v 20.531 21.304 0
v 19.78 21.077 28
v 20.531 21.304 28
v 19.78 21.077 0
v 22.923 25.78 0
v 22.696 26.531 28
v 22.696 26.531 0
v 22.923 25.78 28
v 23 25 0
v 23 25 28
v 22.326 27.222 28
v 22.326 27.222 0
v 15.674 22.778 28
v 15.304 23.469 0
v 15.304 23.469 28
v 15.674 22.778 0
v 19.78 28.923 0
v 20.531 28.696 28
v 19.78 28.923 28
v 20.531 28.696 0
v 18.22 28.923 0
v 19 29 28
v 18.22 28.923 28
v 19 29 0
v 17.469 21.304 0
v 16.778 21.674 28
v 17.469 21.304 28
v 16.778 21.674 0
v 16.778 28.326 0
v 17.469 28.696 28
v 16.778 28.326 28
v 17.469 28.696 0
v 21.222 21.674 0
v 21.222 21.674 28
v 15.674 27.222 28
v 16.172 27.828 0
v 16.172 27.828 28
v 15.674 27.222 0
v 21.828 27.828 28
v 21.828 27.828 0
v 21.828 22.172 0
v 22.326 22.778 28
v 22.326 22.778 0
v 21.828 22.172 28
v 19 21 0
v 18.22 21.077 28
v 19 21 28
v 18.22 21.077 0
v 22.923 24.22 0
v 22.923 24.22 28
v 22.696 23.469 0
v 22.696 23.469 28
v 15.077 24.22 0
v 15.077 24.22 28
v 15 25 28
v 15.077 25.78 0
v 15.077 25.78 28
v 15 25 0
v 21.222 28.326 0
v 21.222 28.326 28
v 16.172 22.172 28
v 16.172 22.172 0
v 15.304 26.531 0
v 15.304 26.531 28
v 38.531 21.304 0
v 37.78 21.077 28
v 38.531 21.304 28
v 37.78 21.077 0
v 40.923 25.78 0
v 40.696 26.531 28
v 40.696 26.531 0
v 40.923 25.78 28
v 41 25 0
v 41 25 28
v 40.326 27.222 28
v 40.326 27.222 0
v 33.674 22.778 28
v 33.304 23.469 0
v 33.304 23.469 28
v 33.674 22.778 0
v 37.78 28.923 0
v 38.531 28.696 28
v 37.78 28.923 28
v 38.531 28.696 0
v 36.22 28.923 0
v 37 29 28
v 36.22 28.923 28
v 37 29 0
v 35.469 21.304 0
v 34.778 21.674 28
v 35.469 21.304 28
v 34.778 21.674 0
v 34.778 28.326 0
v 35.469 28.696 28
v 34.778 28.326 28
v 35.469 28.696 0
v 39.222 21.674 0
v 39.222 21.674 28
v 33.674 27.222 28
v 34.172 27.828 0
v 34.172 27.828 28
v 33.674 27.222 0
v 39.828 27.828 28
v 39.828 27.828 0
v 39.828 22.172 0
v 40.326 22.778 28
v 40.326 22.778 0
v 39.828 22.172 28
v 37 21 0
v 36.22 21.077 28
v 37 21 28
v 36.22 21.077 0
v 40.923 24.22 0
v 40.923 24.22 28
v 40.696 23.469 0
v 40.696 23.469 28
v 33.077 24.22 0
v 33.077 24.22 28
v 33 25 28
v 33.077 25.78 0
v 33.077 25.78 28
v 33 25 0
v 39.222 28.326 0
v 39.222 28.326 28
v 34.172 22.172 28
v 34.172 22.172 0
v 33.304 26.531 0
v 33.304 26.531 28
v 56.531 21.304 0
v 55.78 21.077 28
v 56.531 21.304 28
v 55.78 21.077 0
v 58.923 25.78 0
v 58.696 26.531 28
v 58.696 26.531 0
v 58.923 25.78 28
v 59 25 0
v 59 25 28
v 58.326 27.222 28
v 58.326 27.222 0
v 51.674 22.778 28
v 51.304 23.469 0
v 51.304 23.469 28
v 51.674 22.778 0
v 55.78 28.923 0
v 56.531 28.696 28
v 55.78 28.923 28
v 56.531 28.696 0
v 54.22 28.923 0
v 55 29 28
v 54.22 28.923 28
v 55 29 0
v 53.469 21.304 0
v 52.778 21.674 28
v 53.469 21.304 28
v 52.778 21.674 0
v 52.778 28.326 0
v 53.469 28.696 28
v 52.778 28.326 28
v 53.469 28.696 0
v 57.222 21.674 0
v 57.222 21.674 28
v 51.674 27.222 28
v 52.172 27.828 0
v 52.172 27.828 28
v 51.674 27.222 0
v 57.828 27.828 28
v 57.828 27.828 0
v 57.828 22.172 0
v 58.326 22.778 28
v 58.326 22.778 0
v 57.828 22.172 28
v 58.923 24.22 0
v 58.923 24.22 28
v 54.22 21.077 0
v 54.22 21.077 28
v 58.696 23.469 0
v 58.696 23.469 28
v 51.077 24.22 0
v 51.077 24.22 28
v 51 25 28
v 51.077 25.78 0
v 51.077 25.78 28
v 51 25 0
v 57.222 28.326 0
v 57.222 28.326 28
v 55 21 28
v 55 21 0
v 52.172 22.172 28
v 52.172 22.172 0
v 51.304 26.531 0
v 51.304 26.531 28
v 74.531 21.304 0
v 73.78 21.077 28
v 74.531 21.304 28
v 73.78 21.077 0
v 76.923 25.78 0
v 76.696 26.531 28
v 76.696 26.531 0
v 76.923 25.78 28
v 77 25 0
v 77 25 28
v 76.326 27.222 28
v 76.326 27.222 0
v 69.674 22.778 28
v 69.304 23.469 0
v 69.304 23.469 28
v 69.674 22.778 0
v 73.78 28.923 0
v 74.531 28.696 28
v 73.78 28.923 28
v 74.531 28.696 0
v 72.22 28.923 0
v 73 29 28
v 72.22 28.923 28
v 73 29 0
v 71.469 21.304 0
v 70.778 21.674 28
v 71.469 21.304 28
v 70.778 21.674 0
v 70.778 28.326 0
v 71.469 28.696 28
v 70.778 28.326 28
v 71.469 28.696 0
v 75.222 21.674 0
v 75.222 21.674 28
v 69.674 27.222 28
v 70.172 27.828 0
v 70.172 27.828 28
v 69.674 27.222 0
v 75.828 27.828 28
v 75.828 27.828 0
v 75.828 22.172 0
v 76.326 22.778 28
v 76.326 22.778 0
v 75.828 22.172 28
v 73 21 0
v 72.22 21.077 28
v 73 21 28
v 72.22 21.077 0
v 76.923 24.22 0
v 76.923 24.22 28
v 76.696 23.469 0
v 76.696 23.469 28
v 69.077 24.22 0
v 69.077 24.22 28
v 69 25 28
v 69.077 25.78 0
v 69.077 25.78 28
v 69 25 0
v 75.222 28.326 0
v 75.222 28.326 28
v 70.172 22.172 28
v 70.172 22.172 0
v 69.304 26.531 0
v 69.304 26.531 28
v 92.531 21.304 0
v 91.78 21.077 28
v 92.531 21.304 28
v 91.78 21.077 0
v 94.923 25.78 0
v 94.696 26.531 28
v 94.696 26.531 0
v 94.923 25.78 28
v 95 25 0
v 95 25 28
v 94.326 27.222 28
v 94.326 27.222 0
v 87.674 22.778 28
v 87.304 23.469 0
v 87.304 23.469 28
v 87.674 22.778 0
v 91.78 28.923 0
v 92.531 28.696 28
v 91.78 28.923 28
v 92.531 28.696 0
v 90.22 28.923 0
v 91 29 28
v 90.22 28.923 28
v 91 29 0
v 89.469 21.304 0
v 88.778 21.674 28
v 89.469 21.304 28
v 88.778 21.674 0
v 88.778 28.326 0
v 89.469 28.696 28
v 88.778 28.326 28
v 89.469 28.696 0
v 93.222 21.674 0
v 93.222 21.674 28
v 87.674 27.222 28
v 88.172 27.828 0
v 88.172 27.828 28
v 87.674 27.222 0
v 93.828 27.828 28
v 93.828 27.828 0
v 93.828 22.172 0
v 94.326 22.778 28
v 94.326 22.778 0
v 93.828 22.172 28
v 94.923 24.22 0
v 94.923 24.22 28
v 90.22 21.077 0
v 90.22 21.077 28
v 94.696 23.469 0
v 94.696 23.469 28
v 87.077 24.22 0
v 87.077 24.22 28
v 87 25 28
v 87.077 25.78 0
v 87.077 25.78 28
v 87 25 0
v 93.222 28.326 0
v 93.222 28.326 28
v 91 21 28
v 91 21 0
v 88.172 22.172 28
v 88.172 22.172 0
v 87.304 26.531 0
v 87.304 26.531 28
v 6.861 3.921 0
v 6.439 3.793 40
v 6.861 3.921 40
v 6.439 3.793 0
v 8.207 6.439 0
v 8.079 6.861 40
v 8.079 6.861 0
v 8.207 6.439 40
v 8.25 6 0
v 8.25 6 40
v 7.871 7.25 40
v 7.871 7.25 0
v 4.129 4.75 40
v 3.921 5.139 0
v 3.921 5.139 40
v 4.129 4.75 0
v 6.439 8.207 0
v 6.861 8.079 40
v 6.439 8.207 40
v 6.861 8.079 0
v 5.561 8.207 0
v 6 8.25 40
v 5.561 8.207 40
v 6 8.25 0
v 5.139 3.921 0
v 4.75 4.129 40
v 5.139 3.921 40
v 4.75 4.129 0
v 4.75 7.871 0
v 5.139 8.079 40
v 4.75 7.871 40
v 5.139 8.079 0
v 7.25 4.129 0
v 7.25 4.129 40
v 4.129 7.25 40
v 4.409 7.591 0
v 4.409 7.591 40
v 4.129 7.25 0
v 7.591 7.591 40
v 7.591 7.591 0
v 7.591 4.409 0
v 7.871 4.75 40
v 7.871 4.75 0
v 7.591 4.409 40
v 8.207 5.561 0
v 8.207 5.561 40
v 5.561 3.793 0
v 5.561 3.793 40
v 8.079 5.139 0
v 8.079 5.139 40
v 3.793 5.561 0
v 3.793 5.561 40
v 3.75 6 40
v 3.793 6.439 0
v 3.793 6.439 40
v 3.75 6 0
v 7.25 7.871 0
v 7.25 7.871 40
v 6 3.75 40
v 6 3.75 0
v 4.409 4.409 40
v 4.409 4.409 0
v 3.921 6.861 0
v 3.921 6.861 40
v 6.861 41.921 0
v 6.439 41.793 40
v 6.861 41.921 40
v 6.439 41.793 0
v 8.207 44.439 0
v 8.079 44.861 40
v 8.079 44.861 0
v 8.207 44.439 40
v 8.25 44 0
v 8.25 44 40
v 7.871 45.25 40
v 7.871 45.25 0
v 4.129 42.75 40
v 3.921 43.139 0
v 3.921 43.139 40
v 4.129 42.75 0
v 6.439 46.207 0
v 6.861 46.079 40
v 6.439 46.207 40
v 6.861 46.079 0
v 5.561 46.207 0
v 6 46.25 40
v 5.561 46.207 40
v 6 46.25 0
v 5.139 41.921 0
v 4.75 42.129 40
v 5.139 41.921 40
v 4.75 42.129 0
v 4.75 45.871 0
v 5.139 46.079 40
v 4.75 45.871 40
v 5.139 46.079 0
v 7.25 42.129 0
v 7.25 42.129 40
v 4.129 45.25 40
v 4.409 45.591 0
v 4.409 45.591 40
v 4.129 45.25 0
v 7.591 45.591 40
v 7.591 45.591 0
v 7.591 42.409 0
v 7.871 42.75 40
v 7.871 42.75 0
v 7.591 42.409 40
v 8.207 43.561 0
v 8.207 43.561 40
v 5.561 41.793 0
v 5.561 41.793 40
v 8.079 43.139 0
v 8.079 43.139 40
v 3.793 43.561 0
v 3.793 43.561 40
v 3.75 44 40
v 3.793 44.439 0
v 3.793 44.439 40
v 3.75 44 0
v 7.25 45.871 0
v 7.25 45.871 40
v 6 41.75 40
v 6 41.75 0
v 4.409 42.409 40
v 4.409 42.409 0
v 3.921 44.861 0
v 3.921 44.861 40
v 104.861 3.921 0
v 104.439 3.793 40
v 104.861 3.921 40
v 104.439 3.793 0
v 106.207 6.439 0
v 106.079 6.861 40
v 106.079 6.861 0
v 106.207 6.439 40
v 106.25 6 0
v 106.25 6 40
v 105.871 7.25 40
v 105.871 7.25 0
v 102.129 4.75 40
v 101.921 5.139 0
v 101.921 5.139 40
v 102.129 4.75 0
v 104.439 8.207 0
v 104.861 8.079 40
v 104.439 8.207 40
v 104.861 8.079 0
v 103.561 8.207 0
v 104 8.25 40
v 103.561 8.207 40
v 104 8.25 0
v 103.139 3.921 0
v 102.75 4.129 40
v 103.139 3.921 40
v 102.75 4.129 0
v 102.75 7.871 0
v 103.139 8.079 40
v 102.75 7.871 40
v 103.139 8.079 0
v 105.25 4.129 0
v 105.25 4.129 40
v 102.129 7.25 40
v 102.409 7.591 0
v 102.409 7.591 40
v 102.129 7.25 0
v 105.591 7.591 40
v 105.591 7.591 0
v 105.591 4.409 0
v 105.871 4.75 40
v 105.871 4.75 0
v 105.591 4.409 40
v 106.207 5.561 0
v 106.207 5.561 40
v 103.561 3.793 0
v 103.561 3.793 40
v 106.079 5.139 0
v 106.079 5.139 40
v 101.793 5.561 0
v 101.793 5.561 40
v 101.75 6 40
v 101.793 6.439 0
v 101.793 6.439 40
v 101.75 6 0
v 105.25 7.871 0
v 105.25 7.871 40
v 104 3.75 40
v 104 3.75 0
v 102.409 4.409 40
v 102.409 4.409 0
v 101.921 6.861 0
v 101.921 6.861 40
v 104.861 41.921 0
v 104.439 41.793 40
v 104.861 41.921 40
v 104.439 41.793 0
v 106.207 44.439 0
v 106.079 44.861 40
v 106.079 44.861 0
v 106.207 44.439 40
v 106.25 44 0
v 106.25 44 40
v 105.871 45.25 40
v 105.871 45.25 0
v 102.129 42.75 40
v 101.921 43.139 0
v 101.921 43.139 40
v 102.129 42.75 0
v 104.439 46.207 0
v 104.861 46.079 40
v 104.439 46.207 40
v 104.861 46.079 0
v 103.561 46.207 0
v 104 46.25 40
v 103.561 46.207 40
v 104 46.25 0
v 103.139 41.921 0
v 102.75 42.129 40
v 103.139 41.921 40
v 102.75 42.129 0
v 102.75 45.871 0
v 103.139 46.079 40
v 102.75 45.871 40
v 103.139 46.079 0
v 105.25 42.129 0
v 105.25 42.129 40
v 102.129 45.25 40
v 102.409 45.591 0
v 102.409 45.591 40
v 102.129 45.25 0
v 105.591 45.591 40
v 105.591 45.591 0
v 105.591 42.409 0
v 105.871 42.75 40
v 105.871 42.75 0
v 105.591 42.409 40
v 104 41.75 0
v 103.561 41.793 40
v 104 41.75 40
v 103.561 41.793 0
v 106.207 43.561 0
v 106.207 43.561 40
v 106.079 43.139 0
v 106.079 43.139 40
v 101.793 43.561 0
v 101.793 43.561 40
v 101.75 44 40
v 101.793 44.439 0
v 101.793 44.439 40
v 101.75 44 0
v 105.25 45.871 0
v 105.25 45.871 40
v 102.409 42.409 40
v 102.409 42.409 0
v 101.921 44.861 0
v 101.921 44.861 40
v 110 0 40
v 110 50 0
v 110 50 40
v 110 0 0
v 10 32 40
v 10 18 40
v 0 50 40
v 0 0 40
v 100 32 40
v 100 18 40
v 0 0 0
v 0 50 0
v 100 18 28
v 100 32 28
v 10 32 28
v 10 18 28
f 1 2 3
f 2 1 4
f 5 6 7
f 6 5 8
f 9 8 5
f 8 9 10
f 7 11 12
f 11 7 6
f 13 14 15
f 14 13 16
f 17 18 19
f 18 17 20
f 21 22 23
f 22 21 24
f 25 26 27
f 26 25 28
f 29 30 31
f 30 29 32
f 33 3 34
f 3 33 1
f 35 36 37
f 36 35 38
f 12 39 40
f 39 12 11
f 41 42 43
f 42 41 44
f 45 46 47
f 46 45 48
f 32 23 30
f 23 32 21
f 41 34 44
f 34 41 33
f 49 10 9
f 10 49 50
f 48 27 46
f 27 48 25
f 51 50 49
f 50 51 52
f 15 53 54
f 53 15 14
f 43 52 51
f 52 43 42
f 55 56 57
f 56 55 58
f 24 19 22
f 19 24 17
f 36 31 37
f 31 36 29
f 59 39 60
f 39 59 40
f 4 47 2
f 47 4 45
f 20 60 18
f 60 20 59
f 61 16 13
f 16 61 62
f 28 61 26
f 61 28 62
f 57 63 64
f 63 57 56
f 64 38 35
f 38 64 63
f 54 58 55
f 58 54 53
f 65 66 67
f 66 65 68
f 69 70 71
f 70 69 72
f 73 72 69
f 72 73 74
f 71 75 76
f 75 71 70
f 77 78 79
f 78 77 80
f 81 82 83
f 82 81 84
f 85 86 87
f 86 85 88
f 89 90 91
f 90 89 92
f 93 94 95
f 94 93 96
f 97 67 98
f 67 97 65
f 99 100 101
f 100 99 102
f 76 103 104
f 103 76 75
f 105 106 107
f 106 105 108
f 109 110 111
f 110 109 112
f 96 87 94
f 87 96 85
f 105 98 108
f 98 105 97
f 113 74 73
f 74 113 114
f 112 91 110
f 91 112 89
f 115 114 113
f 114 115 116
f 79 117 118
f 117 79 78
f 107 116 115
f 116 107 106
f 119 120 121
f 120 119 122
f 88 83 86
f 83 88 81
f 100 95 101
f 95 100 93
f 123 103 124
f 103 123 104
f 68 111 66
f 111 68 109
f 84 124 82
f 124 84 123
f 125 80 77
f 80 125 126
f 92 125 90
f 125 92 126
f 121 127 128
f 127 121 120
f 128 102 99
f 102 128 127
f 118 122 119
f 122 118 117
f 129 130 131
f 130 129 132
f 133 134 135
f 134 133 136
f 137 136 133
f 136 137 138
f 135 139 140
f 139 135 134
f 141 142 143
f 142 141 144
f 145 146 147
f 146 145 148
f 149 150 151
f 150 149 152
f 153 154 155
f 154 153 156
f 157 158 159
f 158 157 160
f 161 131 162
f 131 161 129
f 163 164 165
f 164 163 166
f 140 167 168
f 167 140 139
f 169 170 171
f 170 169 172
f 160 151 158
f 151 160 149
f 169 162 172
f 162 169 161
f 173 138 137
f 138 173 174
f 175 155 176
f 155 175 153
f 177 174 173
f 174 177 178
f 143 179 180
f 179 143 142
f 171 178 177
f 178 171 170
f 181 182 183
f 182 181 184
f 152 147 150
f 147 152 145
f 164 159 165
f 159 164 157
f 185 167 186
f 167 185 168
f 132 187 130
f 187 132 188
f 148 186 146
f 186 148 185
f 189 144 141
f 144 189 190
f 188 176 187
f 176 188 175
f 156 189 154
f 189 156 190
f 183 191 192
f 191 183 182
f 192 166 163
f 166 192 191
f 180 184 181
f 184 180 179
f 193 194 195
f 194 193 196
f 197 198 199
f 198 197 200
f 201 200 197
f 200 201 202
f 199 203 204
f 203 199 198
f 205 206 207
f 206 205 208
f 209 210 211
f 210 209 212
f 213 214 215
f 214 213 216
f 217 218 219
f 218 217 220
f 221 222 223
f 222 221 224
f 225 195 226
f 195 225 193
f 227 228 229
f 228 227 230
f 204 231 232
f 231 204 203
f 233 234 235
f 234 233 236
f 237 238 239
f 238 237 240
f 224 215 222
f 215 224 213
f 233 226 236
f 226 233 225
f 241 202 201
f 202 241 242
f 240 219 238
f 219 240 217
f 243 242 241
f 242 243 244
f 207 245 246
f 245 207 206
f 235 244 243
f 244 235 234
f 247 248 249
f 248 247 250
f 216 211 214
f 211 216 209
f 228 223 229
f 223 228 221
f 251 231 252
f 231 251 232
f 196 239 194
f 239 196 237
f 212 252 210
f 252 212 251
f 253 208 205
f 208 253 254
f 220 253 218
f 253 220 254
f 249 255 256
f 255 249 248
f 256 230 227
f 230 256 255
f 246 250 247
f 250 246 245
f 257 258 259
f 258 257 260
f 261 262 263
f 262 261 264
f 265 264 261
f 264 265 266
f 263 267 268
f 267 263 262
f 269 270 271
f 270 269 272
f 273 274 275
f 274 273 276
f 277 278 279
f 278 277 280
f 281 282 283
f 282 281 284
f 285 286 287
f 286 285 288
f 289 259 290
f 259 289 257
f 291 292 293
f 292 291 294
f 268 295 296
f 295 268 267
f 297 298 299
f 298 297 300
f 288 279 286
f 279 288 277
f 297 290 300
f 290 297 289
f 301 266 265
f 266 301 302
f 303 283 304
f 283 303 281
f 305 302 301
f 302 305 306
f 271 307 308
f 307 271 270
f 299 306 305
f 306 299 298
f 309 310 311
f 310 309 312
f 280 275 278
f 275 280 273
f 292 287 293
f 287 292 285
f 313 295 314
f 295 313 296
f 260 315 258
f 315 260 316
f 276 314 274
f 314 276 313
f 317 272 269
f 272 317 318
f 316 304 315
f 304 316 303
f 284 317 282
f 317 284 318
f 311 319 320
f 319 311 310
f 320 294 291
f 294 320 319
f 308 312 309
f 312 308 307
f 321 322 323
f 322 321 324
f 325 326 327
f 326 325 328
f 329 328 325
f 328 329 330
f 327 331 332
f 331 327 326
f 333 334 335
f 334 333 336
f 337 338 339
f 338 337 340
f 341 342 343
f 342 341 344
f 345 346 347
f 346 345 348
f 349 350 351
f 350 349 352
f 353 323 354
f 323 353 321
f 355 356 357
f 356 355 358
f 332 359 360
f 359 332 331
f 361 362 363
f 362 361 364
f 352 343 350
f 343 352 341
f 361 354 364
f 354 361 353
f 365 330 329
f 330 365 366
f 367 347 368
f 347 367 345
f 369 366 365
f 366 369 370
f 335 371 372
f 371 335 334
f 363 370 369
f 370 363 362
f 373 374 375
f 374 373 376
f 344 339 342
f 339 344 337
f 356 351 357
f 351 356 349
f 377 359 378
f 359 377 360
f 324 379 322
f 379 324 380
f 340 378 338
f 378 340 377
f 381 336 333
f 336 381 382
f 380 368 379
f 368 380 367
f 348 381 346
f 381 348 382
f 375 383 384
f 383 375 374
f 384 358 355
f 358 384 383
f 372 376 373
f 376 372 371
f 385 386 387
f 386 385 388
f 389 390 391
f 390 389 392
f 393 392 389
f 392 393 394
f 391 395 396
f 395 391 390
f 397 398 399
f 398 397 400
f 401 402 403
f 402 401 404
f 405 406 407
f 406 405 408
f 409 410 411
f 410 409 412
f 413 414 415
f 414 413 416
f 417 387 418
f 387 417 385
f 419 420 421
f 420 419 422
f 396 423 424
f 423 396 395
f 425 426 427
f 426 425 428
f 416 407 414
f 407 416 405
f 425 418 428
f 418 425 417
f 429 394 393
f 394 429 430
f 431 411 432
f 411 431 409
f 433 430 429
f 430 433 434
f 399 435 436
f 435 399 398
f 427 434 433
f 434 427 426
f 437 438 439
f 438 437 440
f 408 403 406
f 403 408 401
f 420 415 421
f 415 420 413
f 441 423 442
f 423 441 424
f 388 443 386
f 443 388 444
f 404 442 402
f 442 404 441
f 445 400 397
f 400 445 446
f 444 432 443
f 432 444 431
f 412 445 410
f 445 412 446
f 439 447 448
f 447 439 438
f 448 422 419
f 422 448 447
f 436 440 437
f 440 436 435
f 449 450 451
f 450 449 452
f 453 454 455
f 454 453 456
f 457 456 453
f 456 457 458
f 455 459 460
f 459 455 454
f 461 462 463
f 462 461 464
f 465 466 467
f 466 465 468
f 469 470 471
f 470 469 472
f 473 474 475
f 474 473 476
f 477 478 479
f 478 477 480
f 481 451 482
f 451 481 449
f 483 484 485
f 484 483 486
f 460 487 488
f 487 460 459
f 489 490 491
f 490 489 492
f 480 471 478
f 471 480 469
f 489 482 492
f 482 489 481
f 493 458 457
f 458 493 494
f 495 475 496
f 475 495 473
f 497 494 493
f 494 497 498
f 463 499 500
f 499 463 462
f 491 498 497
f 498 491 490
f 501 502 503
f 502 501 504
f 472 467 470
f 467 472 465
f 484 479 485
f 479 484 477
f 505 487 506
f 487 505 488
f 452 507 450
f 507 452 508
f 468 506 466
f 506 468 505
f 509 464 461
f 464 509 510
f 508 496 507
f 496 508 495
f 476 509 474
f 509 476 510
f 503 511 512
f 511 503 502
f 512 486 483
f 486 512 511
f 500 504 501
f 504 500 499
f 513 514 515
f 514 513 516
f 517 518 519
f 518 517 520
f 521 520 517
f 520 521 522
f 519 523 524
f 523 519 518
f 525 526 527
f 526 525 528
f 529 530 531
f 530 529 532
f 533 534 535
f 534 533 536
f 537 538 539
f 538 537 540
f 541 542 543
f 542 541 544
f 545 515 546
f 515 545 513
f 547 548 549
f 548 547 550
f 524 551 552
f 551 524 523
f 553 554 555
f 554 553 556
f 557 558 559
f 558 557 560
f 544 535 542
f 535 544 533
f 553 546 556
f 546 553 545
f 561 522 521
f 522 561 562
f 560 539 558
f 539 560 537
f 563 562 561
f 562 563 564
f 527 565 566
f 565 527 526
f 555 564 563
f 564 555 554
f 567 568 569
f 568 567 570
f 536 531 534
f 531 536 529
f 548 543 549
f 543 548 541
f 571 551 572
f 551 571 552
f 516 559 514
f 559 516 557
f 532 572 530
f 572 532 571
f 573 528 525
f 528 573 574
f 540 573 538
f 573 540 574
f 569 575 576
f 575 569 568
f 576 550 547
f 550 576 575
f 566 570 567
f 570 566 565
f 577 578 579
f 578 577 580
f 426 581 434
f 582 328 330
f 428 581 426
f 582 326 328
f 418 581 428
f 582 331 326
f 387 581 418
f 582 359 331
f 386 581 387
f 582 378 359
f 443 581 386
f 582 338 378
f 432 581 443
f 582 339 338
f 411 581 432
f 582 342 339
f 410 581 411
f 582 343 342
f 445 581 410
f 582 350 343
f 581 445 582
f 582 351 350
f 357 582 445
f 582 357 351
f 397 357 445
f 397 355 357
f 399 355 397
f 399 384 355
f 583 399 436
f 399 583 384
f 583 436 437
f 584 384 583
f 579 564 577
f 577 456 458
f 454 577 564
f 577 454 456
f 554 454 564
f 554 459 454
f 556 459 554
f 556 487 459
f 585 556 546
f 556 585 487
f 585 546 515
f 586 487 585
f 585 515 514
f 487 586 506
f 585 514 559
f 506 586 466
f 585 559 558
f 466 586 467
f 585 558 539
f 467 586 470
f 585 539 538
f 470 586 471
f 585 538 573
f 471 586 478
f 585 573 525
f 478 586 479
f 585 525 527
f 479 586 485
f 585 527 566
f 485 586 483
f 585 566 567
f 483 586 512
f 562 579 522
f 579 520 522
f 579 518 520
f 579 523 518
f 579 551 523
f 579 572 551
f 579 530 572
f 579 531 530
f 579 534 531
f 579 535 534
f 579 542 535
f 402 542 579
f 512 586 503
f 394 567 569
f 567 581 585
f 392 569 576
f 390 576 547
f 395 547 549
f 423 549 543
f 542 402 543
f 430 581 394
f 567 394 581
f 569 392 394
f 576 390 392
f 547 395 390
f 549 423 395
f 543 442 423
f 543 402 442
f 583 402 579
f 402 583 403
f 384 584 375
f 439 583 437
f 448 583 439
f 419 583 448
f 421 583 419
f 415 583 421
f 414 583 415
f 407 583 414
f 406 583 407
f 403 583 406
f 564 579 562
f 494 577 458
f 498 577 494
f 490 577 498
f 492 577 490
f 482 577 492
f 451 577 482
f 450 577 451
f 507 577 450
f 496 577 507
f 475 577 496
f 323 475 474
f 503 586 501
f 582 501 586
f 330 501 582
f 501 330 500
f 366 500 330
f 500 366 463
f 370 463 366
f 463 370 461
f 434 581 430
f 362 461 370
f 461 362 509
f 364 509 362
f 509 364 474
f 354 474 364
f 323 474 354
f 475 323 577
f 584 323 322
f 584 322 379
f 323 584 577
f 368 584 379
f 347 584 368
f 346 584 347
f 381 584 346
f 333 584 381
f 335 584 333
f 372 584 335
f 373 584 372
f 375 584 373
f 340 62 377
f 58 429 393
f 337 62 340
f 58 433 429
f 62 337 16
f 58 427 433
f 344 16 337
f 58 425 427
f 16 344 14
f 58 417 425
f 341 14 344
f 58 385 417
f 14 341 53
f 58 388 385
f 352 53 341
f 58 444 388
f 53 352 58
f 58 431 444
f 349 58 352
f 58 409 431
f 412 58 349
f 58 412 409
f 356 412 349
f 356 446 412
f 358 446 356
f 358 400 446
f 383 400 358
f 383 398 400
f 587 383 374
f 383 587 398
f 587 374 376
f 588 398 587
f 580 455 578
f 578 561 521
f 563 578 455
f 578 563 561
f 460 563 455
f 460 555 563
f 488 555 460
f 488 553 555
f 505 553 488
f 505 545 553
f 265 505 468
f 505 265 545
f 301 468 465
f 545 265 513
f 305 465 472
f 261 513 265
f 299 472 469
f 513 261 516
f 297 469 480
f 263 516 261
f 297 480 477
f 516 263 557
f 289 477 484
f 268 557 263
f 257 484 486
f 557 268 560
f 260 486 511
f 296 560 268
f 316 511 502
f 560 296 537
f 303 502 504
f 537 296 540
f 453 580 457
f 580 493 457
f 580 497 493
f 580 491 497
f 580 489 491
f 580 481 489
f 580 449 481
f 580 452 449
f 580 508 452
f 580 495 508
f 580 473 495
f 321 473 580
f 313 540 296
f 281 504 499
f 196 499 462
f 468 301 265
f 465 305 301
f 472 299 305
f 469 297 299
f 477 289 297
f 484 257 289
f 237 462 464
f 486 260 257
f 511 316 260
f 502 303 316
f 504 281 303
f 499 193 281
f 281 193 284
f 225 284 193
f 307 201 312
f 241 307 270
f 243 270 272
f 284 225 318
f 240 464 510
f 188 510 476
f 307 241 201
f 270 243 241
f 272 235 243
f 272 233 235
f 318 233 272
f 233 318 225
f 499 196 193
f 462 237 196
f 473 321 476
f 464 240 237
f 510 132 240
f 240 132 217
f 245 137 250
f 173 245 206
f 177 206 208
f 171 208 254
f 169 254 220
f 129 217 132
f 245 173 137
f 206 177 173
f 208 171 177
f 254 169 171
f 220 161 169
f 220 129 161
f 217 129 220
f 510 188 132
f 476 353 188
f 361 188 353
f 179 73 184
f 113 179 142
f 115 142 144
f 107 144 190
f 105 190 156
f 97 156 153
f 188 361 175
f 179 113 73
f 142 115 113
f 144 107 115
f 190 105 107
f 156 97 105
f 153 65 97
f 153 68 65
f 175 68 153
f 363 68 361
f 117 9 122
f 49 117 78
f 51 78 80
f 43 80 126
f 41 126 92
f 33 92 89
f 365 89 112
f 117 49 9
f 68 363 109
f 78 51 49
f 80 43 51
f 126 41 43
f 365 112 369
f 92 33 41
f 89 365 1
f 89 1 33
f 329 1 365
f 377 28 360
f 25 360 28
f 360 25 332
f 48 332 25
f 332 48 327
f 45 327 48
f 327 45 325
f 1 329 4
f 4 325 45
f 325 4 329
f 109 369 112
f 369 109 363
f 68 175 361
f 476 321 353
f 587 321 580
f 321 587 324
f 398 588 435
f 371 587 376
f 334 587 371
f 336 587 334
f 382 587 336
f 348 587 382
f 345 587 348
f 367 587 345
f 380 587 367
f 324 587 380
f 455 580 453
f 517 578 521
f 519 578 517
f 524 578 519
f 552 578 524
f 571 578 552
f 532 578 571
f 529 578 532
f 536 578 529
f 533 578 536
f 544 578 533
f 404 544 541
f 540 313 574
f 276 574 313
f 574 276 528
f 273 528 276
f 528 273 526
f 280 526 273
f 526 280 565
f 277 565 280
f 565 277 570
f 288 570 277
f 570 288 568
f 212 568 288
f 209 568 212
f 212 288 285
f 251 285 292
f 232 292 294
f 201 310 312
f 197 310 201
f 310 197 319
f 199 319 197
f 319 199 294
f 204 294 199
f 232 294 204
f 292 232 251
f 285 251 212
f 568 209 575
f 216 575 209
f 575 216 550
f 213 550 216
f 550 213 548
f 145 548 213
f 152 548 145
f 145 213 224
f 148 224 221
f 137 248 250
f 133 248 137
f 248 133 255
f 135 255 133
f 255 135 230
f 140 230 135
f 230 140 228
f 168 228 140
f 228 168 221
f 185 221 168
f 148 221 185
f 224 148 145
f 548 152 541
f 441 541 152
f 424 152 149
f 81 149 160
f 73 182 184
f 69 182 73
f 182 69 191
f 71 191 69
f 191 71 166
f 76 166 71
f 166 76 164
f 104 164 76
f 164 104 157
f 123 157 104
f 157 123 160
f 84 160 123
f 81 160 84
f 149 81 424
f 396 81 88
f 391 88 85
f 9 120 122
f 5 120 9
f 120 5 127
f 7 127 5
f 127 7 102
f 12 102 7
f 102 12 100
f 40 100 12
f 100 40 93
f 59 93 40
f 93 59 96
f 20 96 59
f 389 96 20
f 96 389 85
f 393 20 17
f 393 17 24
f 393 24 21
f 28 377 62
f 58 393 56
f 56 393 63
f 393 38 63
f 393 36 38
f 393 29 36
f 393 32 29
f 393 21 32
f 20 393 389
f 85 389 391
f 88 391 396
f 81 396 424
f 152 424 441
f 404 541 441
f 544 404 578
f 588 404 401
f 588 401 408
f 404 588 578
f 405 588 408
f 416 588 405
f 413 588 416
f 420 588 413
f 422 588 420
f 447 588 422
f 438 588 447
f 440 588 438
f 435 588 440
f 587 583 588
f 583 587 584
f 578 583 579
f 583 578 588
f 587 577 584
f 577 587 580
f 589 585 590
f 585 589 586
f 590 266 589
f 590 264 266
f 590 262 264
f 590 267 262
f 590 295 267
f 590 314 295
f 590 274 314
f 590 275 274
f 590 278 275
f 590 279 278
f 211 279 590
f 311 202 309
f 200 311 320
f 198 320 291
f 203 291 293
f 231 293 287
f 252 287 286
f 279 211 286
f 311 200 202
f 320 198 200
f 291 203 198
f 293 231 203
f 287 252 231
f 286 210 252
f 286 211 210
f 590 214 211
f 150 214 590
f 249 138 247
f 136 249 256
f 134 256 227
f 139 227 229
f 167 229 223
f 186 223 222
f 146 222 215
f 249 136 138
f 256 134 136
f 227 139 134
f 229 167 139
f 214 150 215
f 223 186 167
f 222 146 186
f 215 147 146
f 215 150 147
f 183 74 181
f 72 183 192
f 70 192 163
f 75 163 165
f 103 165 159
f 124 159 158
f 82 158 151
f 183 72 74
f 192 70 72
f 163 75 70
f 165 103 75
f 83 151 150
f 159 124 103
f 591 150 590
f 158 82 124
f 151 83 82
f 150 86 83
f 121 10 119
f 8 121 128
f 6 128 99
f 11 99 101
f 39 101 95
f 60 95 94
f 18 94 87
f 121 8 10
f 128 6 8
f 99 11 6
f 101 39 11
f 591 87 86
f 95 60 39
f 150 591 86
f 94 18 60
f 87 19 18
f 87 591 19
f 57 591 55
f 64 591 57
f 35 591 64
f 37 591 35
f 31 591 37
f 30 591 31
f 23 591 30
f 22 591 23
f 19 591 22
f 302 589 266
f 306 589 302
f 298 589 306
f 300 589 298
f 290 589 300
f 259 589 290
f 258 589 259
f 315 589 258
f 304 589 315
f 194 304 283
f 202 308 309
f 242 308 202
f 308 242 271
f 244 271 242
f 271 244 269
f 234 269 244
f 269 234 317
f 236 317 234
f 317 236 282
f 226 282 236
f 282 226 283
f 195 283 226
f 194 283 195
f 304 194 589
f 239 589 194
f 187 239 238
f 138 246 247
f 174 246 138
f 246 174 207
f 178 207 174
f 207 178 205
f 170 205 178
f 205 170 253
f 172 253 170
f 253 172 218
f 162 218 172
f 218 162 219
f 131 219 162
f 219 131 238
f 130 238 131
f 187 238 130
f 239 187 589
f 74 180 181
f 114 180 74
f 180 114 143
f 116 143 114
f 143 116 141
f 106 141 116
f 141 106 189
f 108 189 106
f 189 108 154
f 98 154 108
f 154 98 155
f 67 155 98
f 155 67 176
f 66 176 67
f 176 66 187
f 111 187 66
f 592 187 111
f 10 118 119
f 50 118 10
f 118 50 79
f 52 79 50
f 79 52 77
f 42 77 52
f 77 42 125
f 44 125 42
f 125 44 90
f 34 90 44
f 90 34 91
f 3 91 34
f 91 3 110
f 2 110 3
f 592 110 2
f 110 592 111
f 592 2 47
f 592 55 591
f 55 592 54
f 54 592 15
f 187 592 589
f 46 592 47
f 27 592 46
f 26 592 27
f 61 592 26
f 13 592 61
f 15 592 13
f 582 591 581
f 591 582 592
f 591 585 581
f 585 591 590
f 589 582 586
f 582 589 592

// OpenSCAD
$fn = 32;

// ----------------------------------------------------------------------
// Manifold block: gallery_top manifold
// ----------------------------------------------------------------------

// --- parameters (mm) ---
block_l = 110;            // block length, X
block_w = 50;             // block width, Y
block_h = 40;             // block height, Z
port_d = 8;               // port bore diameter
port_pitch = 18;          // port pitch along X
gallery_d = 14;           // top gallery width, Y
gallery_depth = 12;       // gallery pocket depth
wall_p = 10;              // gallery end wall thickness, X
mnt_d = 4.5;              // mounting hole diameter
mnt_in = 6;               // mounting hole inset from the edges

n_ports = 5;  // ports in the row
port_x0 = (block_l - (n_ports - 1) * port_pitch) / 2;  // first port X

difference() {
  cube([block_l, block_w, block_h]);
  for (i = [0 : n_ports - 1])
    translate([port_x0 + i * port_pitch, block_w / 2, -1])
      cylinder(h = block_h + 2, d = port_d);
  translate([wall_p, block_w / 2 - gallery_d / 2, block_h - gallery_depth])
    cube([block_l - 2 * wall_p, gallery_d, gallery_depth + 1]);
  for (cx = [mnt_in, block_l - mnt_in])
    for (cy = [mnt_in, block_w - mnt_in])
      translate([cx, cy, -1]) cylinder(h = block_h + 2, d = mnt_d);
}
